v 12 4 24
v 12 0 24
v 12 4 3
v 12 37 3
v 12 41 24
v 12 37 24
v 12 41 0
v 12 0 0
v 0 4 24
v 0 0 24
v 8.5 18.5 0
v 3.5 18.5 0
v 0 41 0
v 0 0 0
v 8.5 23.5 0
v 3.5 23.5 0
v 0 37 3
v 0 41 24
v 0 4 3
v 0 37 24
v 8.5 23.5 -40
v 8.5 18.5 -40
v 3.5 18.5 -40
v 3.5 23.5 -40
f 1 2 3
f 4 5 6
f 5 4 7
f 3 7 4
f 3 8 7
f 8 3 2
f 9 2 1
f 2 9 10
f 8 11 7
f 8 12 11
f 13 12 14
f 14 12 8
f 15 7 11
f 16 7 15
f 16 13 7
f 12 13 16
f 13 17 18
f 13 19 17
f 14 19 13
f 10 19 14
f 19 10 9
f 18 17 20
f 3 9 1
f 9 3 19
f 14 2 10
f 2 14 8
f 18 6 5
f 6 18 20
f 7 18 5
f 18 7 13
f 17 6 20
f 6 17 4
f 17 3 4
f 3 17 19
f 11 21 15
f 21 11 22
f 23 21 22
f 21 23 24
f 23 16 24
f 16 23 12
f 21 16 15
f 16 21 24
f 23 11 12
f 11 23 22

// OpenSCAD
$fn = 100;

difference() {
    union() {
        cube([12,4,24]);
        translate([0,37,0]) cube([12,4,24]);
        cube([12,41,3]);  


    }

}

translate([3.5,18.5,-40]) cube([5,5,40]);
